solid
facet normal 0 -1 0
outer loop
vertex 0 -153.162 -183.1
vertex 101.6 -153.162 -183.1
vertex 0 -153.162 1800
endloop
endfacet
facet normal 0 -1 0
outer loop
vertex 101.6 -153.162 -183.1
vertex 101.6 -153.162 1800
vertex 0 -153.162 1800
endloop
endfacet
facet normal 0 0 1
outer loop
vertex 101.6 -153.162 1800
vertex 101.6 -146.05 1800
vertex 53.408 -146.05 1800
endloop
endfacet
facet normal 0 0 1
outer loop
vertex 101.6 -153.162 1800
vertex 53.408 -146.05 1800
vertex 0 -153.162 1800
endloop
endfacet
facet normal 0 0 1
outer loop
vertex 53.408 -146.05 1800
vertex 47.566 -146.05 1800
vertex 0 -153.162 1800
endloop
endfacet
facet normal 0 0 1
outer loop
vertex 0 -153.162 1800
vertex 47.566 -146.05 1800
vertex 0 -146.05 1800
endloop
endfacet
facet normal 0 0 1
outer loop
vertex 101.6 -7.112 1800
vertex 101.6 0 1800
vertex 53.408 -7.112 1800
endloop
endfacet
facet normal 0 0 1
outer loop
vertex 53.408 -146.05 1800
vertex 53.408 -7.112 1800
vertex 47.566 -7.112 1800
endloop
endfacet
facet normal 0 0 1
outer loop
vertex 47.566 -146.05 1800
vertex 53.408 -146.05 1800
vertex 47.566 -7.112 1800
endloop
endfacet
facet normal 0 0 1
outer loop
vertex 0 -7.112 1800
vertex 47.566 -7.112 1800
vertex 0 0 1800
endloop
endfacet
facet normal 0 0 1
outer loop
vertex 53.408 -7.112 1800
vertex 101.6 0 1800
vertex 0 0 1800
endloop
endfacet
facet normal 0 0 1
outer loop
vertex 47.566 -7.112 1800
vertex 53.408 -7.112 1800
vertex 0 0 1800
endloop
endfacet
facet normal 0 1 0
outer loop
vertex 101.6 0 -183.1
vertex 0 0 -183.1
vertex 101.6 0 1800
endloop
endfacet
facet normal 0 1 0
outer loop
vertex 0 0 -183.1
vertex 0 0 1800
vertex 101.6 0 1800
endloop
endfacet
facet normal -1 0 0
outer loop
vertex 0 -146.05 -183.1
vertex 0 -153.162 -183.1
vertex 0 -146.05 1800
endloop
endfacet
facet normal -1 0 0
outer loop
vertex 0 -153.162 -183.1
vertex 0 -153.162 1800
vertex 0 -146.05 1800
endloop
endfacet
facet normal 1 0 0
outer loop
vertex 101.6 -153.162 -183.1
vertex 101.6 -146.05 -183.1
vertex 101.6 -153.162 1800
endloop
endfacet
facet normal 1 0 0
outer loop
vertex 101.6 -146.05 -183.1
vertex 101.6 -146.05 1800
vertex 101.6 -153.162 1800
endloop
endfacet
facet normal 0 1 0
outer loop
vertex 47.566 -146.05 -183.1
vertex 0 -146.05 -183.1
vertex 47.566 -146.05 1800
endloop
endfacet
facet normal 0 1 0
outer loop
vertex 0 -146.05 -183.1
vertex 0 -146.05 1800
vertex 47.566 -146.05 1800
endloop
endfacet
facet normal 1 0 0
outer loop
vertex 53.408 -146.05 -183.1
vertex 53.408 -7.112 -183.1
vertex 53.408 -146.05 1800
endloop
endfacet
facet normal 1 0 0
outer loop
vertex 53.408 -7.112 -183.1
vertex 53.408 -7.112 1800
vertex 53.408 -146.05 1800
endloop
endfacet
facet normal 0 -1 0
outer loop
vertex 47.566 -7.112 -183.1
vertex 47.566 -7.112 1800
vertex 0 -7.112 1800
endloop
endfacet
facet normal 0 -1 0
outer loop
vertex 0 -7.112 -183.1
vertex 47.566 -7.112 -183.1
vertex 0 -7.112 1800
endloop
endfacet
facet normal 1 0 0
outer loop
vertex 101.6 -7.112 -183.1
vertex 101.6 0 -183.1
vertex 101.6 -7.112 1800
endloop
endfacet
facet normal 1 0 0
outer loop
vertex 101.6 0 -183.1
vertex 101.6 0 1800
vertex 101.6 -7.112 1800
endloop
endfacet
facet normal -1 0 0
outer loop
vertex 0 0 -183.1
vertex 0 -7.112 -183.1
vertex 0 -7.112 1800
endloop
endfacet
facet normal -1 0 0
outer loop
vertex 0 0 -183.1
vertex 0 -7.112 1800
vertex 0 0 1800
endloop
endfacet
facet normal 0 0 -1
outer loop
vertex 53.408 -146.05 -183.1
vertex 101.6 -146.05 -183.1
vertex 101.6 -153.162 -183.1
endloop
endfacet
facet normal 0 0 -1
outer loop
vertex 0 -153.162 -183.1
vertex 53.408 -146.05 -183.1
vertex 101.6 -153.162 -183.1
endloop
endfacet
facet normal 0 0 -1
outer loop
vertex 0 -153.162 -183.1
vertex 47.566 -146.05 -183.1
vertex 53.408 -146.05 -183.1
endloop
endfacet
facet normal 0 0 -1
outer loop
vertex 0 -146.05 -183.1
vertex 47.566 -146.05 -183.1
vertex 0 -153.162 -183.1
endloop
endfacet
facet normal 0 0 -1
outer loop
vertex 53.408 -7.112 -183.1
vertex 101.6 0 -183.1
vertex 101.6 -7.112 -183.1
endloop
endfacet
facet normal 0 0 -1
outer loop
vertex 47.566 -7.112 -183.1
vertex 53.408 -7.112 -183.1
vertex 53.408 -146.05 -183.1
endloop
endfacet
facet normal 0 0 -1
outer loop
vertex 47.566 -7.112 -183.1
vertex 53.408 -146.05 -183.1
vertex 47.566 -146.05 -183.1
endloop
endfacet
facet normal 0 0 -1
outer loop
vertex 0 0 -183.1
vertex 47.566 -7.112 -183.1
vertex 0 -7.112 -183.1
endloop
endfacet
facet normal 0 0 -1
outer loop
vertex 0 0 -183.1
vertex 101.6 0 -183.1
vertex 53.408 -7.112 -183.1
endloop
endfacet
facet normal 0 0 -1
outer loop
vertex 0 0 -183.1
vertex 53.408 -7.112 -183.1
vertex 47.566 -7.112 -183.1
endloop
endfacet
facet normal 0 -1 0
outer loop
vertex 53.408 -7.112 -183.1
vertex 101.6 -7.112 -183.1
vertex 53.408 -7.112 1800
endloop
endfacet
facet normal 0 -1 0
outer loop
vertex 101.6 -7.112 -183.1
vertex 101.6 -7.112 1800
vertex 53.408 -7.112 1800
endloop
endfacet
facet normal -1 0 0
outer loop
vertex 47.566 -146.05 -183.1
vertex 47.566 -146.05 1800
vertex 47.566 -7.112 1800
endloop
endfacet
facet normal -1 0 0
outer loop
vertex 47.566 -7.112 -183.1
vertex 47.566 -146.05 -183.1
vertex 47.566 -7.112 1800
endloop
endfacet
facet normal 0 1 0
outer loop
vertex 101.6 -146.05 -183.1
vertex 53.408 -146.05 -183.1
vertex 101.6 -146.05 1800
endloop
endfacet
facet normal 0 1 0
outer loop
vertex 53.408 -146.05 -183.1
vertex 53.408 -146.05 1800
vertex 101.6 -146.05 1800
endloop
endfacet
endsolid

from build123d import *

# Parameters (mm, degrees)
BOSS_EXTRUDE1_DEPTH = 1800
BOSS_EXTRUDE2_DEPTH = 183.1


with BuildPart() as part:
    # Sketch1 → Boss-Extrude1 (new body)
    with BuildSketch(Plane.XY):
        Polygon((0, -0.000240533), (101.6, -0.000240533), (101.6, -7.112240533), (53.408035714, -7.112240533), (53.408035714, -146.050240533), (101.6, -146.050240533), (101.6, -153.162240533), (0, -153.162240533), (0, -146.050240533), (47.566035714, -146.050240533), (47.566035714, -7.112240533), (0, -7.112240533), align=None)
    extrude(amount=BOSS_EXTRUDE1_DEPTH)

    # Sketch3 → Boss-Extrude2 (add)
    with BuildSketch(Plane(origin=(0, 0, 0), x_dir=(-1, 0, 0), z_dir=(0, 0, -1))):
        Polygon((0, -7.112240533), (0, -0.000240533), (-101.6, -0.000240533), (-101.6, -7.112240533), (-53.408035714, -7.112240533), (-53.408035714, -146.050240533), (-101.6, -146.050240533), (-101.6, -153.162240533), (0, -153.162240533), (0, -146.050240533), (-47.566035714, -146.050240533), (-47.566035714, -7.112240533), align=None)
    extrude(amount=BOSS_EXTRUDE2_DEPTH)


solid = part.part
